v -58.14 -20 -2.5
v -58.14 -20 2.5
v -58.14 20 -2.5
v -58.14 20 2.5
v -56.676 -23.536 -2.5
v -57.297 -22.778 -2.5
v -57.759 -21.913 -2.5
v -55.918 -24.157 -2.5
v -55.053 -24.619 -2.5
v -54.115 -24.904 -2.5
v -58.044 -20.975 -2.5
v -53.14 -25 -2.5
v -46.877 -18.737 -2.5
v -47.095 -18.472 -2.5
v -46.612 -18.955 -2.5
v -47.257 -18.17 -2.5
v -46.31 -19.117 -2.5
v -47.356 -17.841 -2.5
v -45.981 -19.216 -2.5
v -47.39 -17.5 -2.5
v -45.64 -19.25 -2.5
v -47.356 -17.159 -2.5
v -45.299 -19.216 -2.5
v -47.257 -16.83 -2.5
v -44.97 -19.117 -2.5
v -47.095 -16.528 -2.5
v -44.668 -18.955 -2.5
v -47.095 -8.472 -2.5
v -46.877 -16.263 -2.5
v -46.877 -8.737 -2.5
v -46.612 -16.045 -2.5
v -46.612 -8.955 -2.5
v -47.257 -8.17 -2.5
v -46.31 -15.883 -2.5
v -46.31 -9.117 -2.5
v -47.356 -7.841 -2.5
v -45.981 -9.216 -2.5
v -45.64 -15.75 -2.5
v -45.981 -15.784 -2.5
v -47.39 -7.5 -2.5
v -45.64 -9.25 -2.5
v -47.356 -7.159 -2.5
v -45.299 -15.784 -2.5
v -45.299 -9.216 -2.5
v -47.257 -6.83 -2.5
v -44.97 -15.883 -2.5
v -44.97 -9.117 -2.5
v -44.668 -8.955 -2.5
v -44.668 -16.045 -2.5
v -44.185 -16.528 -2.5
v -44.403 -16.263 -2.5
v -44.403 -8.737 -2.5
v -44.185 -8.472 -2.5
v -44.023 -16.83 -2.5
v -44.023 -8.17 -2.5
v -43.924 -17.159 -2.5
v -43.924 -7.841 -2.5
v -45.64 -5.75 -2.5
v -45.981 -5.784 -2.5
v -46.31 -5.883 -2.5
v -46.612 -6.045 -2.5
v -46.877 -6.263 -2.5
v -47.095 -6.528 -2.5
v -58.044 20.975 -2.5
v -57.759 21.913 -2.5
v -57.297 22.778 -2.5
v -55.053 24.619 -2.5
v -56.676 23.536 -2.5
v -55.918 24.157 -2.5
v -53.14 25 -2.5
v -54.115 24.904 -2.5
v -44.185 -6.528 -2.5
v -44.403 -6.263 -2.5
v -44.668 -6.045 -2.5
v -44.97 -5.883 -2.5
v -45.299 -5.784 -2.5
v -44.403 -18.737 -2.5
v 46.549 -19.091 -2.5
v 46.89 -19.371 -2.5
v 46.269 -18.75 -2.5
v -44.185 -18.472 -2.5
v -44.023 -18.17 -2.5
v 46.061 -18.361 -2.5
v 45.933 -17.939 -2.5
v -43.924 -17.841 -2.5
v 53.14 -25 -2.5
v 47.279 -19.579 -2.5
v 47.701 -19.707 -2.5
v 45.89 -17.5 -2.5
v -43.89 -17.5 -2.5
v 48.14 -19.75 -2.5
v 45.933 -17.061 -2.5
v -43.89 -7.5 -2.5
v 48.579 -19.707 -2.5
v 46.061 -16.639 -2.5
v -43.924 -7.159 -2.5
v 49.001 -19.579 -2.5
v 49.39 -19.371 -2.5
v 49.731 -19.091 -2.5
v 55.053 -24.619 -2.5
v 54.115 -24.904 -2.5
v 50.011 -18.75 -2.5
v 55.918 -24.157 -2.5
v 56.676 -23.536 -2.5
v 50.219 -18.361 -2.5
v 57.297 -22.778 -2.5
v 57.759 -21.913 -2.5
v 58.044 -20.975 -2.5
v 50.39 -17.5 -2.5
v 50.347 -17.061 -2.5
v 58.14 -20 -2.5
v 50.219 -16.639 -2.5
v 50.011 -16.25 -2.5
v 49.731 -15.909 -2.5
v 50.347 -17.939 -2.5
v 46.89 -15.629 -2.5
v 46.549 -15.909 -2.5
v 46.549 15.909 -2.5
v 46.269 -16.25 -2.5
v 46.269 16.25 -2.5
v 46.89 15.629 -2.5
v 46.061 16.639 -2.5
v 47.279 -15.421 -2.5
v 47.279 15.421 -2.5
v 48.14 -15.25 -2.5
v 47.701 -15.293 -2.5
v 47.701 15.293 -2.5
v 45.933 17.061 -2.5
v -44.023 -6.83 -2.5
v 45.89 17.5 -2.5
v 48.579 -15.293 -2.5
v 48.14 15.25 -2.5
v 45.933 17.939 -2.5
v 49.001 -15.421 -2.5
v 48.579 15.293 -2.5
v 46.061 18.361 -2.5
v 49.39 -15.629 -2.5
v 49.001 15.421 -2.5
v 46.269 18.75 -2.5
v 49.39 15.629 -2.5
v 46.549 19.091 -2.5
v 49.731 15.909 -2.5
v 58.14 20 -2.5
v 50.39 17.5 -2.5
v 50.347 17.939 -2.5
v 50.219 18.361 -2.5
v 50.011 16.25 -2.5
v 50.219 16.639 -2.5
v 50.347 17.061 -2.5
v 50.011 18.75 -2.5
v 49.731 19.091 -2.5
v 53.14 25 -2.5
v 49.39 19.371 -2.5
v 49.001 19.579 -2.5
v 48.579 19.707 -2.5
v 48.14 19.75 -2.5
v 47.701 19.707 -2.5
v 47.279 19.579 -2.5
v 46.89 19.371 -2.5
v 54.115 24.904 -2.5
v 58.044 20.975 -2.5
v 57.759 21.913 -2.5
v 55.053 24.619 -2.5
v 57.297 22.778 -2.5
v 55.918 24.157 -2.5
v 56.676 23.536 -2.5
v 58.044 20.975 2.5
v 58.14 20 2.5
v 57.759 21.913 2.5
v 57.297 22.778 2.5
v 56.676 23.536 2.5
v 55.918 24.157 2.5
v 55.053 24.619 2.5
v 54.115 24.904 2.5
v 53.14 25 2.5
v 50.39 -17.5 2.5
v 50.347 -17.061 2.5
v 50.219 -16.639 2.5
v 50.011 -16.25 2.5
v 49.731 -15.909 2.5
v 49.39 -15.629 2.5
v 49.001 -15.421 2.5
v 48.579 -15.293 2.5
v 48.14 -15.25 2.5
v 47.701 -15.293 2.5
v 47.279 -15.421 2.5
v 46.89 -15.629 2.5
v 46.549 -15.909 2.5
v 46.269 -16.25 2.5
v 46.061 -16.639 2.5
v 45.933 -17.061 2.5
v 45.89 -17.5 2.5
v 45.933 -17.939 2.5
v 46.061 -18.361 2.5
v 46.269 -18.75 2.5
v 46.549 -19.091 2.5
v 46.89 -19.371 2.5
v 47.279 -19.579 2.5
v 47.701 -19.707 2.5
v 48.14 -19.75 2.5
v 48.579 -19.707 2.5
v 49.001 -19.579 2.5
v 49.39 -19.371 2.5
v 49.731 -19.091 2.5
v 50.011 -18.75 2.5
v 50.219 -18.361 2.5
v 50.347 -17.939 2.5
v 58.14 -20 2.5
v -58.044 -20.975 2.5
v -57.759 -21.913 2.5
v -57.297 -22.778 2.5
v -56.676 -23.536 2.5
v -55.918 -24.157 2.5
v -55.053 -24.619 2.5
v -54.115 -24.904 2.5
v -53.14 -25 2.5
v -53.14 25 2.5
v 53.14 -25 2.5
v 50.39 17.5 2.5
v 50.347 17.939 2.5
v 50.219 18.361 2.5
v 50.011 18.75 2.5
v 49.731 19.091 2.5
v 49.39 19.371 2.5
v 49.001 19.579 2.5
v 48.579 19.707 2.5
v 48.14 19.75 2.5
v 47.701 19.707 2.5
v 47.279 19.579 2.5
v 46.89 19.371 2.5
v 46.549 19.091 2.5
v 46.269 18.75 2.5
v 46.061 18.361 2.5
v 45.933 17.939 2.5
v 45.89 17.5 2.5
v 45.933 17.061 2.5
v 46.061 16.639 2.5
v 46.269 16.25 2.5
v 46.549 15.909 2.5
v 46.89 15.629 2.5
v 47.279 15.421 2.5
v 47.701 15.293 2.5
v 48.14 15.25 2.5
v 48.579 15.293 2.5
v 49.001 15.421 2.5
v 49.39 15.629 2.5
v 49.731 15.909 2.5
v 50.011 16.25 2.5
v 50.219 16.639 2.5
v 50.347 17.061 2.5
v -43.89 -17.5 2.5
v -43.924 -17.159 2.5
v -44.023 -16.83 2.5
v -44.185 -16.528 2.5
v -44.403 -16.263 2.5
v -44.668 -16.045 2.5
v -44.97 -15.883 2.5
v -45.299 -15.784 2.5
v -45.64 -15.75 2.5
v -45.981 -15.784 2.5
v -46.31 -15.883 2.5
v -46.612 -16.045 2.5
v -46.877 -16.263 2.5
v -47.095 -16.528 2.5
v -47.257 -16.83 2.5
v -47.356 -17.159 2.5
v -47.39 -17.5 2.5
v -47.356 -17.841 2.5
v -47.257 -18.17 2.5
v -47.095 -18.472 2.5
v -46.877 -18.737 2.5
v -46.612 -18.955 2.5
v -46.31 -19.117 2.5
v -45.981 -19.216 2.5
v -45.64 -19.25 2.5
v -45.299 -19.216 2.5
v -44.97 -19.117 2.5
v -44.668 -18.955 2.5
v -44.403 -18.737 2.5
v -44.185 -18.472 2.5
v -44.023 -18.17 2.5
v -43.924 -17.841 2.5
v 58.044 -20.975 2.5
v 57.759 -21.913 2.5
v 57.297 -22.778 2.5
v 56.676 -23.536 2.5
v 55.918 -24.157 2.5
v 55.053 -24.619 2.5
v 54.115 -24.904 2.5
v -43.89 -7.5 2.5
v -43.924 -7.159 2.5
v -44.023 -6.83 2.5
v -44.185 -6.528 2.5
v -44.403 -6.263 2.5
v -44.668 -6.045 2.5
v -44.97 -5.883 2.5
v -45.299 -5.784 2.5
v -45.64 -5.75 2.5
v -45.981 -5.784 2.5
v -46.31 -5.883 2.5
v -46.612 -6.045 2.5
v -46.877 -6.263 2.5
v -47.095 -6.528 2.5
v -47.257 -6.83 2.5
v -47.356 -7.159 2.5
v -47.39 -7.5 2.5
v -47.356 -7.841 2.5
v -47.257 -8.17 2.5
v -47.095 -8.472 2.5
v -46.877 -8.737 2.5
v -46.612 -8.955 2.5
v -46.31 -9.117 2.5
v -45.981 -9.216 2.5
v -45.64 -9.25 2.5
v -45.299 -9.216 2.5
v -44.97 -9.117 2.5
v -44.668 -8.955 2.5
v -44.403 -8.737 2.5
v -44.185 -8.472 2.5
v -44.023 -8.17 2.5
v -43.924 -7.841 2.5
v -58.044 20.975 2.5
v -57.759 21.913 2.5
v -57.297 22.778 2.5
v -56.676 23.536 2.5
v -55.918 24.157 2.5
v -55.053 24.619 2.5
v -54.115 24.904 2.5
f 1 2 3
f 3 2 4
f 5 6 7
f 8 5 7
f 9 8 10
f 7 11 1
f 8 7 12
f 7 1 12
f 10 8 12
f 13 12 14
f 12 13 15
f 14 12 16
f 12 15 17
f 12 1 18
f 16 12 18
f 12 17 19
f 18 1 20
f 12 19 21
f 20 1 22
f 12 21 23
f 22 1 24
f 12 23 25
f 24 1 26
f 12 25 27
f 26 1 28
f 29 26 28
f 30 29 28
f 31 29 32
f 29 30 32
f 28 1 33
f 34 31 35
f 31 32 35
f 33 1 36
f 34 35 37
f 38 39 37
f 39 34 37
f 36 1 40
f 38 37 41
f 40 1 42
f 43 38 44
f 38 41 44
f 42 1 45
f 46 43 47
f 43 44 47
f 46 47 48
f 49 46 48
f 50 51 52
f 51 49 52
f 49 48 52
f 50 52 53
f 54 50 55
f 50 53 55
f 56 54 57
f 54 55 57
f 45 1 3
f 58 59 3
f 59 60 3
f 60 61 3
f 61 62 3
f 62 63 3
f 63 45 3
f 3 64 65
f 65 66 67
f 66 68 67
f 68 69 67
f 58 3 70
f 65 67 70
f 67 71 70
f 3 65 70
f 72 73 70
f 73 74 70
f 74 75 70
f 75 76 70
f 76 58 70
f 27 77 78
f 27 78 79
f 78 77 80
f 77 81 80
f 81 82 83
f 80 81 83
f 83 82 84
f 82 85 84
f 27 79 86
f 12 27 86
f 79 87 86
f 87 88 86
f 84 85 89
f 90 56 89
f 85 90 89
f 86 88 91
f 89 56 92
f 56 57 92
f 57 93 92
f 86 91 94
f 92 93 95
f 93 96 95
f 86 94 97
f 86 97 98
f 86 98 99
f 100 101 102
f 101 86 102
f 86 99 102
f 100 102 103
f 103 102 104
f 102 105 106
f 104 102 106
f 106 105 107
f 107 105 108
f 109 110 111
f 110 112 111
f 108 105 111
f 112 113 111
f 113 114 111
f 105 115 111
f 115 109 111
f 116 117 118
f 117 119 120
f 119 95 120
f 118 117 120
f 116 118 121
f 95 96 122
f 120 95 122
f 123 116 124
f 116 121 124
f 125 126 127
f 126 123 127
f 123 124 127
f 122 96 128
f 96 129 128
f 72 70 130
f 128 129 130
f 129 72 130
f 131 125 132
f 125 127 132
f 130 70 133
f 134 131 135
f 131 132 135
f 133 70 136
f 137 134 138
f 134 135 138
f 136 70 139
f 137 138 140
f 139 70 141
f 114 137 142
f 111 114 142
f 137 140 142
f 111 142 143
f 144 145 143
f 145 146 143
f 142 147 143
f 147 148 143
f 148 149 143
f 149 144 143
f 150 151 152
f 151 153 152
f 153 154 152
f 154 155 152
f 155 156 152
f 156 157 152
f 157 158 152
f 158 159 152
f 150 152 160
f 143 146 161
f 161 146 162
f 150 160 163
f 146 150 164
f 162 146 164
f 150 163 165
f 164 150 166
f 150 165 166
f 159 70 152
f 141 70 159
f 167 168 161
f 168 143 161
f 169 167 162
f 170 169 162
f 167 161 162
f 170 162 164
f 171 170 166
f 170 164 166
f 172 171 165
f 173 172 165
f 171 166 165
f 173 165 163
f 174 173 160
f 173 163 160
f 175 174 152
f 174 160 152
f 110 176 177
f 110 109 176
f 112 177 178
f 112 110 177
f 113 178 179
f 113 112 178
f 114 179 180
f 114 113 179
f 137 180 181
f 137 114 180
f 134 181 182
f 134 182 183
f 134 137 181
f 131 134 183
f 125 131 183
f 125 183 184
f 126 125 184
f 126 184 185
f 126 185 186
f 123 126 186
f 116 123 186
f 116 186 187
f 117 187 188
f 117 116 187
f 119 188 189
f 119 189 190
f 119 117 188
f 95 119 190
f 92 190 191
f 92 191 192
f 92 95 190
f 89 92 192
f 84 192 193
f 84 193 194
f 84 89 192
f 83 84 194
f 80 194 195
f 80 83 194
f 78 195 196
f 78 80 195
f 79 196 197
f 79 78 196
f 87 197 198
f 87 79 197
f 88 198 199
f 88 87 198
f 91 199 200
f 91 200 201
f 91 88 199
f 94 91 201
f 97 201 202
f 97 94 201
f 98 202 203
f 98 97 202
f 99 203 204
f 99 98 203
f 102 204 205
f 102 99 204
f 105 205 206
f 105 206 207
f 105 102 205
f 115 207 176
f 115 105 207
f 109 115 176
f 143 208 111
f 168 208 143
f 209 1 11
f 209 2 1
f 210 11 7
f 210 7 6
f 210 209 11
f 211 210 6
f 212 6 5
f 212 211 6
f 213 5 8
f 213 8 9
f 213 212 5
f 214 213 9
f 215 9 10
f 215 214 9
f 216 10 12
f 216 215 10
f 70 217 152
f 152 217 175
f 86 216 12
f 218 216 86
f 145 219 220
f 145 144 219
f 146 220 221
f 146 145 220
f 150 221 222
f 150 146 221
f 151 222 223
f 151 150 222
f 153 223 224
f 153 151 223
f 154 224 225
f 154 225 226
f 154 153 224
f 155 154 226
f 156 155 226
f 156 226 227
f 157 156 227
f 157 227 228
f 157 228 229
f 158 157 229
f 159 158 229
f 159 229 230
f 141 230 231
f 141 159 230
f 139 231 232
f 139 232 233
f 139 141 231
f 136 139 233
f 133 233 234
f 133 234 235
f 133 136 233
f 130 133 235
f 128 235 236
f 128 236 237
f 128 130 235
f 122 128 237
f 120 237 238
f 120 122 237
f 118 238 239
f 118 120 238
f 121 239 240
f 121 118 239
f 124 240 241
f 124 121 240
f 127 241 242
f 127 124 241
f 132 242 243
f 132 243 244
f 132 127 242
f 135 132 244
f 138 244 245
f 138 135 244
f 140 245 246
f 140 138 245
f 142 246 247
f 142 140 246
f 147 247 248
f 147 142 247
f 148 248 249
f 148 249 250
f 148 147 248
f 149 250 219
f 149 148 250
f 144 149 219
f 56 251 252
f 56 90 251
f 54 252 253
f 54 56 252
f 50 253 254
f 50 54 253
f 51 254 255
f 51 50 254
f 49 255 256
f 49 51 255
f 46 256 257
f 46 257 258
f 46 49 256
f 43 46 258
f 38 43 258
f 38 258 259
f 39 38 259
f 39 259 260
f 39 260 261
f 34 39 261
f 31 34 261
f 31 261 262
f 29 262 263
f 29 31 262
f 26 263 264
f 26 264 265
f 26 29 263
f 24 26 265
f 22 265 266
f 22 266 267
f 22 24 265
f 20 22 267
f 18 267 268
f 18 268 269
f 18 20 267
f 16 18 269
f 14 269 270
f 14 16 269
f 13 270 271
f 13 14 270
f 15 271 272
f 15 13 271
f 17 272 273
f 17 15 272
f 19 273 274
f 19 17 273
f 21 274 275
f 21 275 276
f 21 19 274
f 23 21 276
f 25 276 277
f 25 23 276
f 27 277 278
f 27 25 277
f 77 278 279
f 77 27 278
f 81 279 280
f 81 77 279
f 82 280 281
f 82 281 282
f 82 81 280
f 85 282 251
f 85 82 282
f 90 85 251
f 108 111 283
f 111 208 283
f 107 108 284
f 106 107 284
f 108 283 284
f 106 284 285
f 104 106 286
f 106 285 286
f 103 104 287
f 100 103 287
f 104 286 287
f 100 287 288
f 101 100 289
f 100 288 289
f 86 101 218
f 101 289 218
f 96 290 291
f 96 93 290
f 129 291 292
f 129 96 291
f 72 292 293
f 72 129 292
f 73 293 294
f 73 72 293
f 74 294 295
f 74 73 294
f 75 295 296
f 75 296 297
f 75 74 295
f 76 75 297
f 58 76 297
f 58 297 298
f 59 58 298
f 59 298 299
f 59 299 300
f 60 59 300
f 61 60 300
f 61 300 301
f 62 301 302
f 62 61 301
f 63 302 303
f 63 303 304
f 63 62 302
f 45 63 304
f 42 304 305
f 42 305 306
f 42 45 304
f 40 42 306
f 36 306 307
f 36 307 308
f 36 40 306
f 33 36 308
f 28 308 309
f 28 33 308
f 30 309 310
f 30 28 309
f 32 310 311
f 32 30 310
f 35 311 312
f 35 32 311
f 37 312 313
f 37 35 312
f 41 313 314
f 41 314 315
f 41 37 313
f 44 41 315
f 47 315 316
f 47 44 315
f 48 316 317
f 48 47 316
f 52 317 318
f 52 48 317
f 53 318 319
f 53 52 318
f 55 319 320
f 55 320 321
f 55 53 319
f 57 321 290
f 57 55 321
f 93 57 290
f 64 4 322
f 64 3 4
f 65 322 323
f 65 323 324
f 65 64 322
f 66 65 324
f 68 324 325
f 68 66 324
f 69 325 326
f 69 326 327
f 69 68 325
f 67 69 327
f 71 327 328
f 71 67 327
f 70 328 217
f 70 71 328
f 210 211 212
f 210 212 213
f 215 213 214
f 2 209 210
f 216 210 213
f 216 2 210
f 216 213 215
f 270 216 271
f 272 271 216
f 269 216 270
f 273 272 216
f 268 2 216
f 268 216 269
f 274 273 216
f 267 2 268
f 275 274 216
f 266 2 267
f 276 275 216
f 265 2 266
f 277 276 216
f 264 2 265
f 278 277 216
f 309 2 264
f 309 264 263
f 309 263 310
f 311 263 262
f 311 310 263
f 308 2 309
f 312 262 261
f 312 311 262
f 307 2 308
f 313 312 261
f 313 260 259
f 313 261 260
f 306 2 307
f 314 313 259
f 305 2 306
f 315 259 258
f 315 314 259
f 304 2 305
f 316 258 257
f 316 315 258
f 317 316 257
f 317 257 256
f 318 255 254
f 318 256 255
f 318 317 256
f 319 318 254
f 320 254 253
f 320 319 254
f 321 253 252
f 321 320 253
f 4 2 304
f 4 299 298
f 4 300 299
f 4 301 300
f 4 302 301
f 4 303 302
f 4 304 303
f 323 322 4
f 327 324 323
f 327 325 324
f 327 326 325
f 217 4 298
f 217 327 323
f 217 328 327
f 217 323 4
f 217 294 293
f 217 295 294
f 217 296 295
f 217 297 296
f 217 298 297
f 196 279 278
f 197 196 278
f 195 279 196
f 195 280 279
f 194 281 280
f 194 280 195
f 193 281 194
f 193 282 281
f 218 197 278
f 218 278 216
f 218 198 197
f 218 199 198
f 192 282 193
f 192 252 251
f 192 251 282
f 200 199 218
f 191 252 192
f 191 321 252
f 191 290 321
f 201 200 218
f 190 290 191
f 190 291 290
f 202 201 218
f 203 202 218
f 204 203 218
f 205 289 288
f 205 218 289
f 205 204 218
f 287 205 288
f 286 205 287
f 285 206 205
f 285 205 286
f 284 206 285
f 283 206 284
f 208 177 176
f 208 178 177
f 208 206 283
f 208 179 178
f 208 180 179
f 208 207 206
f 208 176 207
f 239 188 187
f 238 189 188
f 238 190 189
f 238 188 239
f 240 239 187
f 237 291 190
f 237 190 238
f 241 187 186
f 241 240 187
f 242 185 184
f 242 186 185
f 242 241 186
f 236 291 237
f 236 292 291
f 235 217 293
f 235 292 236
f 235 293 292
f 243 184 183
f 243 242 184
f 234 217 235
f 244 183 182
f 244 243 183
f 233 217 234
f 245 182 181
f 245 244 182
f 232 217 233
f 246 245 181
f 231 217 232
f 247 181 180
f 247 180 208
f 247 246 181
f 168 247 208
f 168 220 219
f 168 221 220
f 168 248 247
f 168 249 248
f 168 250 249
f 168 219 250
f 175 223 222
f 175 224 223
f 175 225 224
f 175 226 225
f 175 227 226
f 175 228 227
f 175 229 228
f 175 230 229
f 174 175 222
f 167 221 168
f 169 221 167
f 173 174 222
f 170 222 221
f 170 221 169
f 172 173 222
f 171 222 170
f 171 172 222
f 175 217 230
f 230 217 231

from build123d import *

# Parameters (mm, degrees)
F0_W     = 116.28
F0_H     = 50
F0_R     = 1.75
F0_R_2   = 2.25
F1_DEPTH = 2.5
F2_R     = 5


with BuildPart() as f1:
    # F0 (on Top) → F1 (new body, symmetric)
    with BuildSketch(Plane.XY):
        Rectangle(F0_W, F0_H)
        with Locations((-45.64, -17.5)):
            Circle(F0_R, mode=Mode.SUBTRACT)
        with Locations((-45.64, -7.5)):
            Circle(F0_R, mode=Mode.SUBTRACT)
        with Locations((48.14, -17.5)):
            Circle(F0_R_2, mode=Mode.SUBTRACT)
        with Locations((48.14, 17.5)):
            Circle(F0_R_2, mode=Mode.SUBTRACT)
    extrude(amount=F1_DEPTH, both=True)

    # F2
    f2_edges = [f1.edges().sort_by_distance(p)[0] for p in [
        (-58.14, -25, 0),
        (58.14, -25, 0),
        (58.14, 25, 0),
        (-58.14, 25, 0),
    ]]
    fillet(f2_edges, radius=F2_R)


solid = f1.part
